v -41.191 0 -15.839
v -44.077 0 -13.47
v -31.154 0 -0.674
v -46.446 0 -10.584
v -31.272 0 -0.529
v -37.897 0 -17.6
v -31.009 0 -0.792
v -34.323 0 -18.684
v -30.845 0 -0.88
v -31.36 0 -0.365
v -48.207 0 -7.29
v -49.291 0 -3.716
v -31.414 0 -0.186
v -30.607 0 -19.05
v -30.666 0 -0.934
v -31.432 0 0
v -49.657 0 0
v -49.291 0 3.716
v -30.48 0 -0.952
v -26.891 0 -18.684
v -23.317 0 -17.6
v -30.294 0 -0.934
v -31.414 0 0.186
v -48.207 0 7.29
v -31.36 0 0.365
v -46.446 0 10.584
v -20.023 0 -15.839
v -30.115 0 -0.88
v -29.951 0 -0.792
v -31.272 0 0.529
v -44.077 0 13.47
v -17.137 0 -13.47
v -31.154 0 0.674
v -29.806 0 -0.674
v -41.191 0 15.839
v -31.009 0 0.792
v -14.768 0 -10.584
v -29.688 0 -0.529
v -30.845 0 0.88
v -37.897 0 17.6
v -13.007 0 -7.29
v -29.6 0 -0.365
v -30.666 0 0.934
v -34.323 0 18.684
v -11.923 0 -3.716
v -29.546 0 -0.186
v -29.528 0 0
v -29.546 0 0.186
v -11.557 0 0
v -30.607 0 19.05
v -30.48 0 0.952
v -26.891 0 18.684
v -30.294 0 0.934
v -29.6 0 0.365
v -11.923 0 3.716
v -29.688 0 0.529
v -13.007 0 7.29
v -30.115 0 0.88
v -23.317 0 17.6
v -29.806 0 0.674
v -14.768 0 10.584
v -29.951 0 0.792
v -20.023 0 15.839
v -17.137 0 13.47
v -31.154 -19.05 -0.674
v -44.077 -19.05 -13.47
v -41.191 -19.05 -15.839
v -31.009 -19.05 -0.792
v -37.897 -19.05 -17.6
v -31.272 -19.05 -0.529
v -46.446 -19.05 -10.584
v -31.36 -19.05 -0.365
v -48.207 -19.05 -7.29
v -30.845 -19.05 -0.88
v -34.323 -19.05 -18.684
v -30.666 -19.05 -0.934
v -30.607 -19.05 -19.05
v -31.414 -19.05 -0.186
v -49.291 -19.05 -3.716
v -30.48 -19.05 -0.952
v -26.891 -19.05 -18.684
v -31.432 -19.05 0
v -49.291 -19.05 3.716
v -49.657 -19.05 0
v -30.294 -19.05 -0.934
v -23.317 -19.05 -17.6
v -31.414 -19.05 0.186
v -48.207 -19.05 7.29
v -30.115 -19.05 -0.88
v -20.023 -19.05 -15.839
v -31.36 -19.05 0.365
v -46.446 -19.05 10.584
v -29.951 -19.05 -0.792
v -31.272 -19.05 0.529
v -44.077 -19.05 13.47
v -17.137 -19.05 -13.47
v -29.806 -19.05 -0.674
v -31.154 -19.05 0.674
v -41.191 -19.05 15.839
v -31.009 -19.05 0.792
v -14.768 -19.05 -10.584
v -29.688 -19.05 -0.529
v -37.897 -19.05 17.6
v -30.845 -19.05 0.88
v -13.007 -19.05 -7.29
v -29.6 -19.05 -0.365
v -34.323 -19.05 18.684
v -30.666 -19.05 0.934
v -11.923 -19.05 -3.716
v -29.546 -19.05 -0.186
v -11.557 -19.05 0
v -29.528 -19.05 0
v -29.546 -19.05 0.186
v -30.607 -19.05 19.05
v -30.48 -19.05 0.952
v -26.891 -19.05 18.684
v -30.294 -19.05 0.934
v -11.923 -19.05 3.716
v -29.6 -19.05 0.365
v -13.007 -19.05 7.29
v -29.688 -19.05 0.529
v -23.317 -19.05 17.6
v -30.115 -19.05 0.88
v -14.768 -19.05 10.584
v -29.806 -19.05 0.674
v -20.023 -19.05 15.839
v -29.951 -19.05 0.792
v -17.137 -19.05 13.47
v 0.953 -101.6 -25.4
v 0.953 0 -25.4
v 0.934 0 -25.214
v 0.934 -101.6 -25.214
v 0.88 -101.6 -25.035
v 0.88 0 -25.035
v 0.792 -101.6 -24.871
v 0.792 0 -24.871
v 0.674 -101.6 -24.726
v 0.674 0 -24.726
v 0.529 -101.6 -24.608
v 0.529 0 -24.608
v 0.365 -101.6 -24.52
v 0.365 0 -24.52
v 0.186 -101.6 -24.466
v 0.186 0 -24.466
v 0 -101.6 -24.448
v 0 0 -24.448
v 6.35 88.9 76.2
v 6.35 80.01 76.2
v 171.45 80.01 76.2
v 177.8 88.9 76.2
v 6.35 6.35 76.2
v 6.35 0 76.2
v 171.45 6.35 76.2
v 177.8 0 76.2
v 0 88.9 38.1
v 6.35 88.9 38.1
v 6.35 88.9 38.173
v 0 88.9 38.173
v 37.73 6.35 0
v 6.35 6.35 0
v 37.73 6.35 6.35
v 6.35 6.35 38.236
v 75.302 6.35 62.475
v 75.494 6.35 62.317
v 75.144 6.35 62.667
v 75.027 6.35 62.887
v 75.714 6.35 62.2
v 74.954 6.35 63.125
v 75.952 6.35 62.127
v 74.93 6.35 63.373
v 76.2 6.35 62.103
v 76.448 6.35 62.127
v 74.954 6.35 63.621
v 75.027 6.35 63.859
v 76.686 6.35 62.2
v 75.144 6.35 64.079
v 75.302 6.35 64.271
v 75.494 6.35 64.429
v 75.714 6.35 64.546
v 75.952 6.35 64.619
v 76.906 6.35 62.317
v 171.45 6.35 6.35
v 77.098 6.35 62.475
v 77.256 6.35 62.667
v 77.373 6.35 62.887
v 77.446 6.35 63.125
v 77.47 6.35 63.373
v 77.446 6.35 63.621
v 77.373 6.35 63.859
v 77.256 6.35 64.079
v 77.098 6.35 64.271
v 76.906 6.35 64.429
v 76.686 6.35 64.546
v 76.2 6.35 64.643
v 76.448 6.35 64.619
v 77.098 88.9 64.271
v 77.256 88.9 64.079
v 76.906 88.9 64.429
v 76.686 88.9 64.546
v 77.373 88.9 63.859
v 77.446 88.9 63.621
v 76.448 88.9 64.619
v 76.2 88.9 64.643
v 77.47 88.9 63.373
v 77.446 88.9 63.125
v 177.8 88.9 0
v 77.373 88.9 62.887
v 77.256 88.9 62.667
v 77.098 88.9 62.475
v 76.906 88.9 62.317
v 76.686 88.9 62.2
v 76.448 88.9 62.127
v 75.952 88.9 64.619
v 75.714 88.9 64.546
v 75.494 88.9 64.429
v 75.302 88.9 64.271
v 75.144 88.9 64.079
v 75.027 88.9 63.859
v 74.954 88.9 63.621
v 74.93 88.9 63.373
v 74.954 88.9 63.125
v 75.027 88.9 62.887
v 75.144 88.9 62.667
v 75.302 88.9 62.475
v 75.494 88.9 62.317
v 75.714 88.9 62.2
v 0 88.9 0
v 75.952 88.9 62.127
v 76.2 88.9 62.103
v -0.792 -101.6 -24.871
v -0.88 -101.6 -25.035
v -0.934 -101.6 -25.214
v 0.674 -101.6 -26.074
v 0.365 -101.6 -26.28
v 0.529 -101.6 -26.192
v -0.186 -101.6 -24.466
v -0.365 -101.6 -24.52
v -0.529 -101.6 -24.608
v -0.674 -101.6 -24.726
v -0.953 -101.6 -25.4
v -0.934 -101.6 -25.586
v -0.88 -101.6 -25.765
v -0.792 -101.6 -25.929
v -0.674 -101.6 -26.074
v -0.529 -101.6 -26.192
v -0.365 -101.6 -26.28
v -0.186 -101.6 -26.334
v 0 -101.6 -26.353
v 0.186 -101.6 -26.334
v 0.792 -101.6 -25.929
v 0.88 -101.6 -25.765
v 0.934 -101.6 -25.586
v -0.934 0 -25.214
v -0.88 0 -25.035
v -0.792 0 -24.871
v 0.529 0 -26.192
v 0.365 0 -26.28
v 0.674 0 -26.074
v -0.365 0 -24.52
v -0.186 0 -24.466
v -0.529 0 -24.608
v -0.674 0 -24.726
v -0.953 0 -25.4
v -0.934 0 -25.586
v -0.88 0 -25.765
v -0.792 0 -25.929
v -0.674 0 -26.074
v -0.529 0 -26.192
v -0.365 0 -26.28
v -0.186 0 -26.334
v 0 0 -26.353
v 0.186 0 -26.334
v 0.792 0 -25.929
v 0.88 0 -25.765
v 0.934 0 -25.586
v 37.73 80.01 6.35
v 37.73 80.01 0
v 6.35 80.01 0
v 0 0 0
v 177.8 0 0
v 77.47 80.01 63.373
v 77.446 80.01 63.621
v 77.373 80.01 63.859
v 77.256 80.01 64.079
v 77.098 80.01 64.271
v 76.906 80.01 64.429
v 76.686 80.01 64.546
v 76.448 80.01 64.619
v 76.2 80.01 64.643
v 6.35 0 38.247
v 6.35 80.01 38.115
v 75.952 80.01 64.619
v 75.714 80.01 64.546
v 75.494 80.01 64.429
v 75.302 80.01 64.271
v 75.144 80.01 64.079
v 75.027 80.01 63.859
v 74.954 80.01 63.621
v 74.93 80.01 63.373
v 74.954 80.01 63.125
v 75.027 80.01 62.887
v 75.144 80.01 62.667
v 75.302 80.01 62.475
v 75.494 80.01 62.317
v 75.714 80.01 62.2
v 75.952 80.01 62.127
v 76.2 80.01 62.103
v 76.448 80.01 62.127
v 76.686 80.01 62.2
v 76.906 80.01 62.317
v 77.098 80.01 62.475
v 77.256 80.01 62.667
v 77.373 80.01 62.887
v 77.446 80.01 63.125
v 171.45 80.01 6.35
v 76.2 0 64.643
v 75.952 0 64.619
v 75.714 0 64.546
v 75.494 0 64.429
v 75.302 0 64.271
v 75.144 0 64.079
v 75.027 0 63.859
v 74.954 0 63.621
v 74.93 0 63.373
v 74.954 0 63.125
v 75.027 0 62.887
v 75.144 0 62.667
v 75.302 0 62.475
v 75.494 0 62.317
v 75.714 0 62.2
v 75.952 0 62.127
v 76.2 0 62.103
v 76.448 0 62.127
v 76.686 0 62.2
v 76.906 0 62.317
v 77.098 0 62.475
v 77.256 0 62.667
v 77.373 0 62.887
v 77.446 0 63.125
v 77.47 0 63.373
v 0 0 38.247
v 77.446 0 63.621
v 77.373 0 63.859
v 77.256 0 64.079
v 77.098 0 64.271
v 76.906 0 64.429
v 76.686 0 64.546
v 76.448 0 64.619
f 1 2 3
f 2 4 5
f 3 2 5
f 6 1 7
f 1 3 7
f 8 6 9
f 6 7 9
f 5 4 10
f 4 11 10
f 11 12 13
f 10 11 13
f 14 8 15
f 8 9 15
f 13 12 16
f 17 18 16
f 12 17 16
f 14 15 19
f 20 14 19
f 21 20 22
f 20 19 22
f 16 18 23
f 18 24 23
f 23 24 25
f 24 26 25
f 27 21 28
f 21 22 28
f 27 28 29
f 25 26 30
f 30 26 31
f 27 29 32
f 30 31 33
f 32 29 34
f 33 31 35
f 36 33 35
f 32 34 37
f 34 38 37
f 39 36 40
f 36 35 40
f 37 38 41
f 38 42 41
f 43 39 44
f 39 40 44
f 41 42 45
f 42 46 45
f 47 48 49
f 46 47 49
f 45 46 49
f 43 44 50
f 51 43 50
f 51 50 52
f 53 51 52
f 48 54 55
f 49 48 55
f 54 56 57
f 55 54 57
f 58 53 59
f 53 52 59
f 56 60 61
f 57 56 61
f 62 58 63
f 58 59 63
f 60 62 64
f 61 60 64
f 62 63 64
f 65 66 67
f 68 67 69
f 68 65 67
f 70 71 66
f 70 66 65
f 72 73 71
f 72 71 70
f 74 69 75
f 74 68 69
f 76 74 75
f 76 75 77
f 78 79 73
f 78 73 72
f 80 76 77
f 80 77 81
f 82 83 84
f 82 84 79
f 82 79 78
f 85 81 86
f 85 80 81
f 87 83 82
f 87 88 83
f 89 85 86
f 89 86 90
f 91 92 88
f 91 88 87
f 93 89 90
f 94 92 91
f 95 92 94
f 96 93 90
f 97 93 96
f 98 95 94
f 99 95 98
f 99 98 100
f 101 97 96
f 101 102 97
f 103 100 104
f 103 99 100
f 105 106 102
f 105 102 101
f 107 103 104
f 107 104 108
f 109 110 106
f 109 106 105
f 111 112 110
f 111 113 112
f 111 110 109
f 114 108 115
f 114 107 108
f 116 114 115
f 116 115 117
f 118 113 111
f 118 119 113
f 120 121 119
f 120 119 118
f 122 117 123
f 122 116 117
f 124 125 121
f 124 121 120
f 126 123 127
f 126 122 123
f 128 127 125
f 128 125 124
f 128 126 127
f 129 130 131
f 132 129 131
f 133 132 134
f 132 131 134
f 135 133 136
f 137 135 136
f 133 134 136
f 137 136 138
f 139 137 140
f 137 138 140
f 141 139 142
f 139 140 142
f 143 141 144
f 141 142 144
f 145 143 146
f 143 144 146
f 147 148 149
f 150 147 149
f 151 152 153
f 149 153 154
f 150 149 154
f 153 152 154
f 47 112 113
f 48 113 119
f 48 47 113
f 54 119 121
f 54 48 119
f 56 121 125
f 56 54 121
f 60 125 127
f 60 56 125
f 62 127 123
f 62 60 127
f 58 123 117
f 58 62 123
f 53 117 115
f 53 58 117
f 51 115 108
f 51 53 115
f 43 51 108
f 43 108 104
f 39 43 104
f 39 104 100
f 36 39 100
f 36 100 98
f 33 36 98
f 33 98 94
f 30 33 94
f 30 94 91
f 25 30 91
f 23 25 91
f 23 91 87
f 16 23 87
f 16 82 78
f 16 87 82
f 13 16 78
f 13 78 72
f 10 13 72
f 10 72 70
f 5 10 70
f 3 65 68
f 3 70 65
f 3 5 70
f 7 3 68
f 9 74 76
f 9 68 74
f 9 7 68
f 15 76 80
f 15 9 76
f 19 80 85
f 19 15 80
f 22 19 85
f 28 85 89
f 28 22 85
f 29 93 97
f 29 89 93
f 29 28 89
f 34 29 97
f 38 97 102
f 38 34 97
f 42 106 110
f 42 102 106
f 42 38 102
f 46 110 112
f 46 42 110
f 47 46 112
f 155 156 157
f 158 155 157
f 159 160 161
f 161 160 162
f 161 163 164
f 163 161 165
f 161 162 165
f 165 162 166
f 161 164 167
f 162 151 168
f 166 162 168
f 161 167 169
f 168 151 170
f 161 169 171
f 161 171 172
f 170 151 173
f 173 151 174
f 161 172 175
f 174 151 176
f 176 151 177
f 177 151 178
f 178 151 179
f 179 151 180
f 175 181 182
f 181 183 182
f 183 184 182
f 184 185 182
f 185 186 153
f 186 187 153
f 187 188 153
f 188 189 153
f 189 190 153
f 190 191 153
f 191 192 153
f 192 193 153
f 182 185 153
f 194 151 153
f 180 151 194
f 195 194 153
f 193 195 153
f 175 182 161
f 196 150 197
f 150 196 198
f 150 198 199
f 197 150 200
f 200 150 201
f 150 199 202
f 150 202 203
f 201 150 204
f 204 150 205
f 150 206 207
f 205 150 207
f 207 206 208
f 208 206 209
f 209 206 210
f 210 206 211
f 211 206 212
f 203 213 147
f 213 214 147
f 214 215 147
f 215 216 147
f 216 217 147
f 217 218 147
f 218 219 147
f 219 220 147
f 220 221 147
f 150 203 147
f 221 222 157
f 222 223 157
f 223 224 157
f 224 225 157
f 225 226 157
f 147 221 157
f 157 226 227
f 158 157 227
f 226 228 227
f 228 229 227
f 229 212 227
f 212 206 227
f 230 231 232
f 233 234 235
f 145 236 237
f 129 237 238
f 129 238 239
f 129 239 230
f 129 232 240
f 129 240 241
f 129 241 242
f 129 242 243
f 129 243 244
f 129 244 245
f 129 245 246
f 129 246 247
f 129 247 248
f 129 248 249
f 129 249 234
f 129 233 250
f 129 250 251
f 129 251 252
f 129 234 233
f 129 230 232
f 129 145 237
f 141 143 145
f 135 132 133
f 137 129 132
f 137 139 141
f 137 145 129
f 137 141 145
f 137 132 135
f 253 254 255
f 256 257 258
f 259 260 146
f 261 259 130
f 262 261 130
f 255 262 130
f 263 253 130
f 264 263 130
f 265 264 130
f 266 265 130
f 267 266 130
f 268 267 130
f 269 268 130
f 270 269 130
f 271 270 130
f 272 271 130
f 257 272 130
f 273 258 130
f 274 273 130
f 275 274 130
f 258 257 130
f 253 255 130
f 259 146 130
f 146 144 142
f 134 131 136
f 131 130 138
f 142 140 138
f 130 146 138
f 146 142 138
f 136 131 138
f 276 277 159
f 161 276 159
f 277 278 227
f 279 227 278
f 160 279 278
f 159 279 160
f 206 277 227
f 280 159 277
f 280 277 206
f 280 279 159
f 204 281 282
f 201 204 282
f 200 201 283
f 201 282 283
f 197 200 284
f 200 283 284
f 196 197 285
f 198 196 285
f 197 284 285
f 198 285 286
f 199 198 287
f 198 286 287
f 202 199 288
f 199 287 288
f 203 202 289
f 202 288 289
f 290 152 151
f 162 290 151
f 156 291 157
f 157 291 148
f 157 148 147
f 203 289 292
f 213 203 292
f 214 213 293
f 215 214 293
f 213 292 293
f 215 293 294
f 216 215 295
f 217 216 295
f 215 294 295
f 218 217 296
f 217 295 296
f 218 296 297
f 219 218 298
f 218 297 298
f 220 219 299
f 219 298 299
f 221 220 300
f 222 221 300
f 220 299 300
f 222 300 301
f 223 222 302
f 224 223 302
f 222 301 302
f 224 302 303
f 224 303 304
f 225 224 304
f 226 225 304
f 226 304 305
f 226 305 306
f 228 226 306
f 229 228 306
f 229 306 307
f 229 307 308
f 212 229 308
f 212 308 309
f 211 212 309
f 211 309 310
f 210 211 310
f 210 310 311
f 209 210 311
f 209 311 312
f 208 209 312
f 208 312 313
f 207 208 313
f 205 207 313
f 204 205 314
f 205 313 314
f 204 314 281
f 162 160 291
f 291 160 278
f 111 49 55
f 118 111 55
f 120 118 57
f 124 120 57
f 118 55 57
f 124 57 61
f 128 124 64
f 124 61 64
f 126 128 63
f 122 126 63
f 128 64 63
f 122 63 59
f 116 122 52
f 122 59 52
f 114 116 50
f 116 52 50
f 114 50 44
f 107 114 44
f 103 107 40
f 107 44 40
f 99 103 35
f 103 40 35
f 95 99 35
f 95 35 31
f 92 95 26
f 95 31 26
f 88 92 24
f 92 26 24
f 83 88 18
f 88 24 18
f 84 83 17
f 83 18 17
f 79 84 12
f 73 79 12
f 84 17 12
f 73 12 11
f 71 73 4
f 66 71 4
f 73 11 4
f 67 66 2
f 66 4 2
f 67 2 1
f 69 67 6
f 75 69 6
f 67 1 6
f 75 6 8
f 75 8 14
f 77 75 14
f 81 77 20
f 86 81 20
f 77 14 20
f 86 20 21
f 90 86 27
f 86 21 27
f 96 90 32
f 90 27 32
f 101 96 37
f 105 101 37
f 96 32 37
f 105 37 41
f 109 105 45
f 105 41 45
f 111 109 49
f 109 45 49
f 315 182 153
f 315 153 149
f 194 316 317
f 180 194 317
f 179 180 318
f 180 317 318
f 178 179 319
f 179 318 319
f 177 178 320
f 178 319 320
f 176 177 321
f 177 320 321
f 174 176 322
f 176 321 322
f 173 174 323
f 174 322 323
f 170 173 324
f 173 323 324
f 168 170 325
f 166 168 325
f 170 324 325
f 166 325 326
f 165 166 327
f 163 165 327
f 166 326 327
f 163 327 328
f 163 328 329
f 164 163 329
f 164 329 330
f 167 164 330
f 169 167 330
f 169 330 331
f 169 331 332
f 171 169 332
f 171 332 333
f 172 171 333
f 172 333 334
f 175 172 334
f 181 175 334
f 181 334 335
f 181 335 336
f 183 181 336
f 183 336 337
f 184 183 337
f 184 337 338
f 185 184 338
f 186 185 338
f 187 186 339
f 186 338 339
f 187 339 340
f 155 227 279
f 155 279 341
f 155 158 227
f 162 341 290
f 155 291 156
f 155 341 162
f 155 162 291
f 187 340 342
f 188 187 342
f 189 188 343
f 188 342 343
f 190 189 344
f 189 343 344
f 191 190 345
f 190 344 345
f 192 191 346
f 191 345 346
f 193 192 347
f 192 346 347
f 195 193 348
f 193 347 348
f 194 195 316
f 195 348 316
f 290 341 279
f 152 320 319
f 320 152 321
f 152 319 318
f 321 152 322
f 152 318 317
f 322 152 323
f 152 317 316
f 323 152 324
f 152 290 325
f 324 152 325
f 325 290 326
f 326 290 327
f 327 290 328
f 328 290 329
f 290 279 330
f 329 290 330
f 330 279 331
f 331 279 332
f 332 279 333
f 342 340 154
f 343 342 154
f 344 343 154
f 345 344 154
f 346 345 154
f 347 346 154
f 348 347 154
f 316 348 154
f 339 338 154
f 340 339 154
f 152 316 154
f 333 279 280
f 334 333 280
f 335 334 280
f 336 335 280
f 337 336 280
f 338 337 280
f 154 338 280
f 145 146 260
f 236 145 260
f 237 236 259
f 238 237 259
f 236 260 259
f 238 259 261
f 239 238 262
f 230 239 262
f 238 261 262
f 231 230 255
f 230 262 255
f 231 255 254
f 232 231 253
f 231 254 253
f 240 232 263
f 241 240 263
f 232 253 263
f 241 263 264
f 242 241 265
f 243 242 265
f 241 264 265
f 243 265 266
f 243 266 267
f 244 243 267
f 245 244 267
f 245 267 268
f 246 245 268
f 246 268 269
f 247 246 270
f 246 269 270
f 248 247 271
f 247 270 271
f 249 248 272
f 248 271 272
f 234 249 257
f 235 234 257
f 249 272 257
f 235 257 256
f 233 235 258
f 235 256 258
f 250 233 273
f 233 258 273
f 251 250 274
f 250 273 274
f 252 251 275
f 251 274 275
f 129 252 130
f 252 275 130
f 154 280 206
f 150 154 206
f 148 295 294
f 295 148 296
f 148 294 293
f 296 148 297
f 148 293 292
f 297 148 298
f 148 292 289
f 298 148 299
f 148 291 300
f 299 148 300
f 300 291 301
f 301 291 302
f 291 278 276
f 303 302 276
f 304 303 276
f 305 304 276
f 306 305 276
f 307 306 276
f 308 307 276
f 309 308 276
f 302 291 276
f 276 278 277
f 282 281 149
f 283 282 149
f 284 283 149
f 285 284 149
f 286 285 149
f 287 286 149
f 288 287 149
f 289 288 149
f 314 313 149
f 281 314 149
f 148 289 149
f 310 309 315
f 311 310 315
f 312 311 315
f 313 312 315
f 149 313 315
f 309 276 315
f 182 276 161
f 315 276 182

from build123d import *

# Parameters (mm, degrees)
F0_W      = 177.8
F0_H      = 76.2
F1_DEPTH  = 6.35
F2_W      = 6.35
F2_H      = 80.01
F2_H_2    = 8.89
F2_W_2    = 165.1
F3_DEPTH  = 76.2
F5_DEPTH  = 6.35
F6_W      = 88.9
F6_H      = 38.1
F7_DEPTH  = 6.35
F9_R      = 19.05
F10_DEPTH = 19.05
F11_DEPTH = 254
F14_DEPTH = 6.35
F15_DEPTH = 6.35
F16_R     = 1.27
F17_DEPTH = 76.2
F18_DEPTH = 76.2
F20_DEPTH = 101.6
F21_R     = 0.9525
F22_DEPTH = 76.2
F23_DEPTH = 101.6


with BuildPart() as f1:
    # F0 (on Front) → F1 (new body)
    with BuildSketch(Plane.XZ):
        with Locations((88.9, 38.1)):
            Rectangle(F0_W, F0_H)
    extrude(amount=-F1_DEPTH)

    # F2 (on Top) → F3 (join)
    with BuildSketch(Plane.XY):
        with Locations((3.175, 40.005)):
            Rectangle(F2_W, F2_H)
        with Locations((3.175, 84.455)):
            Rectangle(F2_W, F2_H_2)
        with Locations((88.9, 84.455)):
            Rectangle(F2_W_2, F2_H_2)
        with Locations((174.625, 40.005)):
            Rectangle(F2_W, F2_H)
        with Locations((174.625, 84.455)):
            Rectangle(F2_W, F2_H_2)
    extrude(amount=F3_DEPTH)

    # F4 (on Top) → F5 (join)
    with BuildSketch(Plane.XY):
        Polygon((37.7295836806, 0), (177.4295836806, 0), (177.5142401457, 88.7624174356), (37.7295836806, 88.7624174356), align=None)
    extrude(amount=F5_DEPTH)

    # F6 (on Right) → F7 (cut)
    with BuildSketch(Plane.YZ):
        with Locations((44.45, 57.15)):
            Rectangle(F6_W, F6_H)
    extrude(amount=-F7_DEPTH, mode=Mode.SUBTRACT)

    # F8 (on Front) → F11 (cut)
    with BuildSketch(Plane.XZ):
        with BuildLine():
            ThreePointArc((76.2, 64.6429983449), (75.3019743879, 62.4749727328), (77.47, 63.3729983449))
            ThreePointArc((77.47, 63.3729983449), (77.0980256121, 64.271023957), (76.2, 64.6429983449))
        make_face()
    extrude(amount=-F11_DEPTH, mode=Mode.SUBTRACT)

    # F12 (on Right) → F14 (cut)
    with BuildSketch(Plane.YZ):
        Polygon((0, 38.2467526443), (88.8998788732, 38.1), (88.9627729493, 76.2), (0, 76.2), align=None)
    extrude(amount=-F14_DEPTH, mode=Mode.SUBTRACT)

    # F13 (on face) → F15 (cut)
    with BuildSketch(Plane.YZ):
        Polygon((0, 76.2), (0, 38.2467526443), (88.8998788732, 38.1), (88.9627729493, 76.2), align=None)
    extrude(amount=F15_DEPTH, mode=Mode.SUBTRACT)

    # F16 (on Front) → F17 (cut)
    with BuildSketch(Plane.XZ):
        with Locations((-30.6824948639, 0)):
            Circle(F16_R)
    extrude(amount=-F17_DEPTH, mode=Mode.SUBTRACT)

    # F16 (on Front) → F18 (cut)
    with BuildSketch(Plane.XZ):
        with Locations((-30.6824948639, 0)):
            Circle(F16_R)
    extrude(amount=-F18_DEPTH, mode=Mode.SUBTRACT)

    # F21 (on Front) → F22 (cut)
    with BuildSketch(Plane.XZ):
        with Locations((-30.48, 0)):
            Circle(F21_R)
    extrude(amount=-F22_DEPTH, mode=Mode.SUBTRACT)


with BuildPart() as f10:
    # F9 (on Front) → F10 (new body)
    with BuildSketch(Plane.XZ):
        with Locations((-30.6069999933, 0)):
            Circle(F9_R)
    extrude(amount=F10_DEPTH)

    # F21 (on Front) → F23 (cut)
    with BuildSketch(Plane.XZ):
        with Locations((-30.48, 0)):
            Circle(F21_R)
    extrude(amount=F23_DEPTH, mode=Mode.SUBTRACT)


with BuildPart() as f20:
    # F19 (on Front) → F20 (new body)
    with BuildSketch(Plane.XZ):
        with BuildLine():
            ThreePointArc((0.9525, -25.4), (0.6735192091, -24.7264807909), (0, -24.4475))
            ThreePointArc((0, -24.4475), (-0.6735192091, -26.0735192091), (0.9525, -25.4))
        make_face()
    extrude(amount=F20_DEPTH)


solid = Compound([f1.part, f10.part, f20.part])
